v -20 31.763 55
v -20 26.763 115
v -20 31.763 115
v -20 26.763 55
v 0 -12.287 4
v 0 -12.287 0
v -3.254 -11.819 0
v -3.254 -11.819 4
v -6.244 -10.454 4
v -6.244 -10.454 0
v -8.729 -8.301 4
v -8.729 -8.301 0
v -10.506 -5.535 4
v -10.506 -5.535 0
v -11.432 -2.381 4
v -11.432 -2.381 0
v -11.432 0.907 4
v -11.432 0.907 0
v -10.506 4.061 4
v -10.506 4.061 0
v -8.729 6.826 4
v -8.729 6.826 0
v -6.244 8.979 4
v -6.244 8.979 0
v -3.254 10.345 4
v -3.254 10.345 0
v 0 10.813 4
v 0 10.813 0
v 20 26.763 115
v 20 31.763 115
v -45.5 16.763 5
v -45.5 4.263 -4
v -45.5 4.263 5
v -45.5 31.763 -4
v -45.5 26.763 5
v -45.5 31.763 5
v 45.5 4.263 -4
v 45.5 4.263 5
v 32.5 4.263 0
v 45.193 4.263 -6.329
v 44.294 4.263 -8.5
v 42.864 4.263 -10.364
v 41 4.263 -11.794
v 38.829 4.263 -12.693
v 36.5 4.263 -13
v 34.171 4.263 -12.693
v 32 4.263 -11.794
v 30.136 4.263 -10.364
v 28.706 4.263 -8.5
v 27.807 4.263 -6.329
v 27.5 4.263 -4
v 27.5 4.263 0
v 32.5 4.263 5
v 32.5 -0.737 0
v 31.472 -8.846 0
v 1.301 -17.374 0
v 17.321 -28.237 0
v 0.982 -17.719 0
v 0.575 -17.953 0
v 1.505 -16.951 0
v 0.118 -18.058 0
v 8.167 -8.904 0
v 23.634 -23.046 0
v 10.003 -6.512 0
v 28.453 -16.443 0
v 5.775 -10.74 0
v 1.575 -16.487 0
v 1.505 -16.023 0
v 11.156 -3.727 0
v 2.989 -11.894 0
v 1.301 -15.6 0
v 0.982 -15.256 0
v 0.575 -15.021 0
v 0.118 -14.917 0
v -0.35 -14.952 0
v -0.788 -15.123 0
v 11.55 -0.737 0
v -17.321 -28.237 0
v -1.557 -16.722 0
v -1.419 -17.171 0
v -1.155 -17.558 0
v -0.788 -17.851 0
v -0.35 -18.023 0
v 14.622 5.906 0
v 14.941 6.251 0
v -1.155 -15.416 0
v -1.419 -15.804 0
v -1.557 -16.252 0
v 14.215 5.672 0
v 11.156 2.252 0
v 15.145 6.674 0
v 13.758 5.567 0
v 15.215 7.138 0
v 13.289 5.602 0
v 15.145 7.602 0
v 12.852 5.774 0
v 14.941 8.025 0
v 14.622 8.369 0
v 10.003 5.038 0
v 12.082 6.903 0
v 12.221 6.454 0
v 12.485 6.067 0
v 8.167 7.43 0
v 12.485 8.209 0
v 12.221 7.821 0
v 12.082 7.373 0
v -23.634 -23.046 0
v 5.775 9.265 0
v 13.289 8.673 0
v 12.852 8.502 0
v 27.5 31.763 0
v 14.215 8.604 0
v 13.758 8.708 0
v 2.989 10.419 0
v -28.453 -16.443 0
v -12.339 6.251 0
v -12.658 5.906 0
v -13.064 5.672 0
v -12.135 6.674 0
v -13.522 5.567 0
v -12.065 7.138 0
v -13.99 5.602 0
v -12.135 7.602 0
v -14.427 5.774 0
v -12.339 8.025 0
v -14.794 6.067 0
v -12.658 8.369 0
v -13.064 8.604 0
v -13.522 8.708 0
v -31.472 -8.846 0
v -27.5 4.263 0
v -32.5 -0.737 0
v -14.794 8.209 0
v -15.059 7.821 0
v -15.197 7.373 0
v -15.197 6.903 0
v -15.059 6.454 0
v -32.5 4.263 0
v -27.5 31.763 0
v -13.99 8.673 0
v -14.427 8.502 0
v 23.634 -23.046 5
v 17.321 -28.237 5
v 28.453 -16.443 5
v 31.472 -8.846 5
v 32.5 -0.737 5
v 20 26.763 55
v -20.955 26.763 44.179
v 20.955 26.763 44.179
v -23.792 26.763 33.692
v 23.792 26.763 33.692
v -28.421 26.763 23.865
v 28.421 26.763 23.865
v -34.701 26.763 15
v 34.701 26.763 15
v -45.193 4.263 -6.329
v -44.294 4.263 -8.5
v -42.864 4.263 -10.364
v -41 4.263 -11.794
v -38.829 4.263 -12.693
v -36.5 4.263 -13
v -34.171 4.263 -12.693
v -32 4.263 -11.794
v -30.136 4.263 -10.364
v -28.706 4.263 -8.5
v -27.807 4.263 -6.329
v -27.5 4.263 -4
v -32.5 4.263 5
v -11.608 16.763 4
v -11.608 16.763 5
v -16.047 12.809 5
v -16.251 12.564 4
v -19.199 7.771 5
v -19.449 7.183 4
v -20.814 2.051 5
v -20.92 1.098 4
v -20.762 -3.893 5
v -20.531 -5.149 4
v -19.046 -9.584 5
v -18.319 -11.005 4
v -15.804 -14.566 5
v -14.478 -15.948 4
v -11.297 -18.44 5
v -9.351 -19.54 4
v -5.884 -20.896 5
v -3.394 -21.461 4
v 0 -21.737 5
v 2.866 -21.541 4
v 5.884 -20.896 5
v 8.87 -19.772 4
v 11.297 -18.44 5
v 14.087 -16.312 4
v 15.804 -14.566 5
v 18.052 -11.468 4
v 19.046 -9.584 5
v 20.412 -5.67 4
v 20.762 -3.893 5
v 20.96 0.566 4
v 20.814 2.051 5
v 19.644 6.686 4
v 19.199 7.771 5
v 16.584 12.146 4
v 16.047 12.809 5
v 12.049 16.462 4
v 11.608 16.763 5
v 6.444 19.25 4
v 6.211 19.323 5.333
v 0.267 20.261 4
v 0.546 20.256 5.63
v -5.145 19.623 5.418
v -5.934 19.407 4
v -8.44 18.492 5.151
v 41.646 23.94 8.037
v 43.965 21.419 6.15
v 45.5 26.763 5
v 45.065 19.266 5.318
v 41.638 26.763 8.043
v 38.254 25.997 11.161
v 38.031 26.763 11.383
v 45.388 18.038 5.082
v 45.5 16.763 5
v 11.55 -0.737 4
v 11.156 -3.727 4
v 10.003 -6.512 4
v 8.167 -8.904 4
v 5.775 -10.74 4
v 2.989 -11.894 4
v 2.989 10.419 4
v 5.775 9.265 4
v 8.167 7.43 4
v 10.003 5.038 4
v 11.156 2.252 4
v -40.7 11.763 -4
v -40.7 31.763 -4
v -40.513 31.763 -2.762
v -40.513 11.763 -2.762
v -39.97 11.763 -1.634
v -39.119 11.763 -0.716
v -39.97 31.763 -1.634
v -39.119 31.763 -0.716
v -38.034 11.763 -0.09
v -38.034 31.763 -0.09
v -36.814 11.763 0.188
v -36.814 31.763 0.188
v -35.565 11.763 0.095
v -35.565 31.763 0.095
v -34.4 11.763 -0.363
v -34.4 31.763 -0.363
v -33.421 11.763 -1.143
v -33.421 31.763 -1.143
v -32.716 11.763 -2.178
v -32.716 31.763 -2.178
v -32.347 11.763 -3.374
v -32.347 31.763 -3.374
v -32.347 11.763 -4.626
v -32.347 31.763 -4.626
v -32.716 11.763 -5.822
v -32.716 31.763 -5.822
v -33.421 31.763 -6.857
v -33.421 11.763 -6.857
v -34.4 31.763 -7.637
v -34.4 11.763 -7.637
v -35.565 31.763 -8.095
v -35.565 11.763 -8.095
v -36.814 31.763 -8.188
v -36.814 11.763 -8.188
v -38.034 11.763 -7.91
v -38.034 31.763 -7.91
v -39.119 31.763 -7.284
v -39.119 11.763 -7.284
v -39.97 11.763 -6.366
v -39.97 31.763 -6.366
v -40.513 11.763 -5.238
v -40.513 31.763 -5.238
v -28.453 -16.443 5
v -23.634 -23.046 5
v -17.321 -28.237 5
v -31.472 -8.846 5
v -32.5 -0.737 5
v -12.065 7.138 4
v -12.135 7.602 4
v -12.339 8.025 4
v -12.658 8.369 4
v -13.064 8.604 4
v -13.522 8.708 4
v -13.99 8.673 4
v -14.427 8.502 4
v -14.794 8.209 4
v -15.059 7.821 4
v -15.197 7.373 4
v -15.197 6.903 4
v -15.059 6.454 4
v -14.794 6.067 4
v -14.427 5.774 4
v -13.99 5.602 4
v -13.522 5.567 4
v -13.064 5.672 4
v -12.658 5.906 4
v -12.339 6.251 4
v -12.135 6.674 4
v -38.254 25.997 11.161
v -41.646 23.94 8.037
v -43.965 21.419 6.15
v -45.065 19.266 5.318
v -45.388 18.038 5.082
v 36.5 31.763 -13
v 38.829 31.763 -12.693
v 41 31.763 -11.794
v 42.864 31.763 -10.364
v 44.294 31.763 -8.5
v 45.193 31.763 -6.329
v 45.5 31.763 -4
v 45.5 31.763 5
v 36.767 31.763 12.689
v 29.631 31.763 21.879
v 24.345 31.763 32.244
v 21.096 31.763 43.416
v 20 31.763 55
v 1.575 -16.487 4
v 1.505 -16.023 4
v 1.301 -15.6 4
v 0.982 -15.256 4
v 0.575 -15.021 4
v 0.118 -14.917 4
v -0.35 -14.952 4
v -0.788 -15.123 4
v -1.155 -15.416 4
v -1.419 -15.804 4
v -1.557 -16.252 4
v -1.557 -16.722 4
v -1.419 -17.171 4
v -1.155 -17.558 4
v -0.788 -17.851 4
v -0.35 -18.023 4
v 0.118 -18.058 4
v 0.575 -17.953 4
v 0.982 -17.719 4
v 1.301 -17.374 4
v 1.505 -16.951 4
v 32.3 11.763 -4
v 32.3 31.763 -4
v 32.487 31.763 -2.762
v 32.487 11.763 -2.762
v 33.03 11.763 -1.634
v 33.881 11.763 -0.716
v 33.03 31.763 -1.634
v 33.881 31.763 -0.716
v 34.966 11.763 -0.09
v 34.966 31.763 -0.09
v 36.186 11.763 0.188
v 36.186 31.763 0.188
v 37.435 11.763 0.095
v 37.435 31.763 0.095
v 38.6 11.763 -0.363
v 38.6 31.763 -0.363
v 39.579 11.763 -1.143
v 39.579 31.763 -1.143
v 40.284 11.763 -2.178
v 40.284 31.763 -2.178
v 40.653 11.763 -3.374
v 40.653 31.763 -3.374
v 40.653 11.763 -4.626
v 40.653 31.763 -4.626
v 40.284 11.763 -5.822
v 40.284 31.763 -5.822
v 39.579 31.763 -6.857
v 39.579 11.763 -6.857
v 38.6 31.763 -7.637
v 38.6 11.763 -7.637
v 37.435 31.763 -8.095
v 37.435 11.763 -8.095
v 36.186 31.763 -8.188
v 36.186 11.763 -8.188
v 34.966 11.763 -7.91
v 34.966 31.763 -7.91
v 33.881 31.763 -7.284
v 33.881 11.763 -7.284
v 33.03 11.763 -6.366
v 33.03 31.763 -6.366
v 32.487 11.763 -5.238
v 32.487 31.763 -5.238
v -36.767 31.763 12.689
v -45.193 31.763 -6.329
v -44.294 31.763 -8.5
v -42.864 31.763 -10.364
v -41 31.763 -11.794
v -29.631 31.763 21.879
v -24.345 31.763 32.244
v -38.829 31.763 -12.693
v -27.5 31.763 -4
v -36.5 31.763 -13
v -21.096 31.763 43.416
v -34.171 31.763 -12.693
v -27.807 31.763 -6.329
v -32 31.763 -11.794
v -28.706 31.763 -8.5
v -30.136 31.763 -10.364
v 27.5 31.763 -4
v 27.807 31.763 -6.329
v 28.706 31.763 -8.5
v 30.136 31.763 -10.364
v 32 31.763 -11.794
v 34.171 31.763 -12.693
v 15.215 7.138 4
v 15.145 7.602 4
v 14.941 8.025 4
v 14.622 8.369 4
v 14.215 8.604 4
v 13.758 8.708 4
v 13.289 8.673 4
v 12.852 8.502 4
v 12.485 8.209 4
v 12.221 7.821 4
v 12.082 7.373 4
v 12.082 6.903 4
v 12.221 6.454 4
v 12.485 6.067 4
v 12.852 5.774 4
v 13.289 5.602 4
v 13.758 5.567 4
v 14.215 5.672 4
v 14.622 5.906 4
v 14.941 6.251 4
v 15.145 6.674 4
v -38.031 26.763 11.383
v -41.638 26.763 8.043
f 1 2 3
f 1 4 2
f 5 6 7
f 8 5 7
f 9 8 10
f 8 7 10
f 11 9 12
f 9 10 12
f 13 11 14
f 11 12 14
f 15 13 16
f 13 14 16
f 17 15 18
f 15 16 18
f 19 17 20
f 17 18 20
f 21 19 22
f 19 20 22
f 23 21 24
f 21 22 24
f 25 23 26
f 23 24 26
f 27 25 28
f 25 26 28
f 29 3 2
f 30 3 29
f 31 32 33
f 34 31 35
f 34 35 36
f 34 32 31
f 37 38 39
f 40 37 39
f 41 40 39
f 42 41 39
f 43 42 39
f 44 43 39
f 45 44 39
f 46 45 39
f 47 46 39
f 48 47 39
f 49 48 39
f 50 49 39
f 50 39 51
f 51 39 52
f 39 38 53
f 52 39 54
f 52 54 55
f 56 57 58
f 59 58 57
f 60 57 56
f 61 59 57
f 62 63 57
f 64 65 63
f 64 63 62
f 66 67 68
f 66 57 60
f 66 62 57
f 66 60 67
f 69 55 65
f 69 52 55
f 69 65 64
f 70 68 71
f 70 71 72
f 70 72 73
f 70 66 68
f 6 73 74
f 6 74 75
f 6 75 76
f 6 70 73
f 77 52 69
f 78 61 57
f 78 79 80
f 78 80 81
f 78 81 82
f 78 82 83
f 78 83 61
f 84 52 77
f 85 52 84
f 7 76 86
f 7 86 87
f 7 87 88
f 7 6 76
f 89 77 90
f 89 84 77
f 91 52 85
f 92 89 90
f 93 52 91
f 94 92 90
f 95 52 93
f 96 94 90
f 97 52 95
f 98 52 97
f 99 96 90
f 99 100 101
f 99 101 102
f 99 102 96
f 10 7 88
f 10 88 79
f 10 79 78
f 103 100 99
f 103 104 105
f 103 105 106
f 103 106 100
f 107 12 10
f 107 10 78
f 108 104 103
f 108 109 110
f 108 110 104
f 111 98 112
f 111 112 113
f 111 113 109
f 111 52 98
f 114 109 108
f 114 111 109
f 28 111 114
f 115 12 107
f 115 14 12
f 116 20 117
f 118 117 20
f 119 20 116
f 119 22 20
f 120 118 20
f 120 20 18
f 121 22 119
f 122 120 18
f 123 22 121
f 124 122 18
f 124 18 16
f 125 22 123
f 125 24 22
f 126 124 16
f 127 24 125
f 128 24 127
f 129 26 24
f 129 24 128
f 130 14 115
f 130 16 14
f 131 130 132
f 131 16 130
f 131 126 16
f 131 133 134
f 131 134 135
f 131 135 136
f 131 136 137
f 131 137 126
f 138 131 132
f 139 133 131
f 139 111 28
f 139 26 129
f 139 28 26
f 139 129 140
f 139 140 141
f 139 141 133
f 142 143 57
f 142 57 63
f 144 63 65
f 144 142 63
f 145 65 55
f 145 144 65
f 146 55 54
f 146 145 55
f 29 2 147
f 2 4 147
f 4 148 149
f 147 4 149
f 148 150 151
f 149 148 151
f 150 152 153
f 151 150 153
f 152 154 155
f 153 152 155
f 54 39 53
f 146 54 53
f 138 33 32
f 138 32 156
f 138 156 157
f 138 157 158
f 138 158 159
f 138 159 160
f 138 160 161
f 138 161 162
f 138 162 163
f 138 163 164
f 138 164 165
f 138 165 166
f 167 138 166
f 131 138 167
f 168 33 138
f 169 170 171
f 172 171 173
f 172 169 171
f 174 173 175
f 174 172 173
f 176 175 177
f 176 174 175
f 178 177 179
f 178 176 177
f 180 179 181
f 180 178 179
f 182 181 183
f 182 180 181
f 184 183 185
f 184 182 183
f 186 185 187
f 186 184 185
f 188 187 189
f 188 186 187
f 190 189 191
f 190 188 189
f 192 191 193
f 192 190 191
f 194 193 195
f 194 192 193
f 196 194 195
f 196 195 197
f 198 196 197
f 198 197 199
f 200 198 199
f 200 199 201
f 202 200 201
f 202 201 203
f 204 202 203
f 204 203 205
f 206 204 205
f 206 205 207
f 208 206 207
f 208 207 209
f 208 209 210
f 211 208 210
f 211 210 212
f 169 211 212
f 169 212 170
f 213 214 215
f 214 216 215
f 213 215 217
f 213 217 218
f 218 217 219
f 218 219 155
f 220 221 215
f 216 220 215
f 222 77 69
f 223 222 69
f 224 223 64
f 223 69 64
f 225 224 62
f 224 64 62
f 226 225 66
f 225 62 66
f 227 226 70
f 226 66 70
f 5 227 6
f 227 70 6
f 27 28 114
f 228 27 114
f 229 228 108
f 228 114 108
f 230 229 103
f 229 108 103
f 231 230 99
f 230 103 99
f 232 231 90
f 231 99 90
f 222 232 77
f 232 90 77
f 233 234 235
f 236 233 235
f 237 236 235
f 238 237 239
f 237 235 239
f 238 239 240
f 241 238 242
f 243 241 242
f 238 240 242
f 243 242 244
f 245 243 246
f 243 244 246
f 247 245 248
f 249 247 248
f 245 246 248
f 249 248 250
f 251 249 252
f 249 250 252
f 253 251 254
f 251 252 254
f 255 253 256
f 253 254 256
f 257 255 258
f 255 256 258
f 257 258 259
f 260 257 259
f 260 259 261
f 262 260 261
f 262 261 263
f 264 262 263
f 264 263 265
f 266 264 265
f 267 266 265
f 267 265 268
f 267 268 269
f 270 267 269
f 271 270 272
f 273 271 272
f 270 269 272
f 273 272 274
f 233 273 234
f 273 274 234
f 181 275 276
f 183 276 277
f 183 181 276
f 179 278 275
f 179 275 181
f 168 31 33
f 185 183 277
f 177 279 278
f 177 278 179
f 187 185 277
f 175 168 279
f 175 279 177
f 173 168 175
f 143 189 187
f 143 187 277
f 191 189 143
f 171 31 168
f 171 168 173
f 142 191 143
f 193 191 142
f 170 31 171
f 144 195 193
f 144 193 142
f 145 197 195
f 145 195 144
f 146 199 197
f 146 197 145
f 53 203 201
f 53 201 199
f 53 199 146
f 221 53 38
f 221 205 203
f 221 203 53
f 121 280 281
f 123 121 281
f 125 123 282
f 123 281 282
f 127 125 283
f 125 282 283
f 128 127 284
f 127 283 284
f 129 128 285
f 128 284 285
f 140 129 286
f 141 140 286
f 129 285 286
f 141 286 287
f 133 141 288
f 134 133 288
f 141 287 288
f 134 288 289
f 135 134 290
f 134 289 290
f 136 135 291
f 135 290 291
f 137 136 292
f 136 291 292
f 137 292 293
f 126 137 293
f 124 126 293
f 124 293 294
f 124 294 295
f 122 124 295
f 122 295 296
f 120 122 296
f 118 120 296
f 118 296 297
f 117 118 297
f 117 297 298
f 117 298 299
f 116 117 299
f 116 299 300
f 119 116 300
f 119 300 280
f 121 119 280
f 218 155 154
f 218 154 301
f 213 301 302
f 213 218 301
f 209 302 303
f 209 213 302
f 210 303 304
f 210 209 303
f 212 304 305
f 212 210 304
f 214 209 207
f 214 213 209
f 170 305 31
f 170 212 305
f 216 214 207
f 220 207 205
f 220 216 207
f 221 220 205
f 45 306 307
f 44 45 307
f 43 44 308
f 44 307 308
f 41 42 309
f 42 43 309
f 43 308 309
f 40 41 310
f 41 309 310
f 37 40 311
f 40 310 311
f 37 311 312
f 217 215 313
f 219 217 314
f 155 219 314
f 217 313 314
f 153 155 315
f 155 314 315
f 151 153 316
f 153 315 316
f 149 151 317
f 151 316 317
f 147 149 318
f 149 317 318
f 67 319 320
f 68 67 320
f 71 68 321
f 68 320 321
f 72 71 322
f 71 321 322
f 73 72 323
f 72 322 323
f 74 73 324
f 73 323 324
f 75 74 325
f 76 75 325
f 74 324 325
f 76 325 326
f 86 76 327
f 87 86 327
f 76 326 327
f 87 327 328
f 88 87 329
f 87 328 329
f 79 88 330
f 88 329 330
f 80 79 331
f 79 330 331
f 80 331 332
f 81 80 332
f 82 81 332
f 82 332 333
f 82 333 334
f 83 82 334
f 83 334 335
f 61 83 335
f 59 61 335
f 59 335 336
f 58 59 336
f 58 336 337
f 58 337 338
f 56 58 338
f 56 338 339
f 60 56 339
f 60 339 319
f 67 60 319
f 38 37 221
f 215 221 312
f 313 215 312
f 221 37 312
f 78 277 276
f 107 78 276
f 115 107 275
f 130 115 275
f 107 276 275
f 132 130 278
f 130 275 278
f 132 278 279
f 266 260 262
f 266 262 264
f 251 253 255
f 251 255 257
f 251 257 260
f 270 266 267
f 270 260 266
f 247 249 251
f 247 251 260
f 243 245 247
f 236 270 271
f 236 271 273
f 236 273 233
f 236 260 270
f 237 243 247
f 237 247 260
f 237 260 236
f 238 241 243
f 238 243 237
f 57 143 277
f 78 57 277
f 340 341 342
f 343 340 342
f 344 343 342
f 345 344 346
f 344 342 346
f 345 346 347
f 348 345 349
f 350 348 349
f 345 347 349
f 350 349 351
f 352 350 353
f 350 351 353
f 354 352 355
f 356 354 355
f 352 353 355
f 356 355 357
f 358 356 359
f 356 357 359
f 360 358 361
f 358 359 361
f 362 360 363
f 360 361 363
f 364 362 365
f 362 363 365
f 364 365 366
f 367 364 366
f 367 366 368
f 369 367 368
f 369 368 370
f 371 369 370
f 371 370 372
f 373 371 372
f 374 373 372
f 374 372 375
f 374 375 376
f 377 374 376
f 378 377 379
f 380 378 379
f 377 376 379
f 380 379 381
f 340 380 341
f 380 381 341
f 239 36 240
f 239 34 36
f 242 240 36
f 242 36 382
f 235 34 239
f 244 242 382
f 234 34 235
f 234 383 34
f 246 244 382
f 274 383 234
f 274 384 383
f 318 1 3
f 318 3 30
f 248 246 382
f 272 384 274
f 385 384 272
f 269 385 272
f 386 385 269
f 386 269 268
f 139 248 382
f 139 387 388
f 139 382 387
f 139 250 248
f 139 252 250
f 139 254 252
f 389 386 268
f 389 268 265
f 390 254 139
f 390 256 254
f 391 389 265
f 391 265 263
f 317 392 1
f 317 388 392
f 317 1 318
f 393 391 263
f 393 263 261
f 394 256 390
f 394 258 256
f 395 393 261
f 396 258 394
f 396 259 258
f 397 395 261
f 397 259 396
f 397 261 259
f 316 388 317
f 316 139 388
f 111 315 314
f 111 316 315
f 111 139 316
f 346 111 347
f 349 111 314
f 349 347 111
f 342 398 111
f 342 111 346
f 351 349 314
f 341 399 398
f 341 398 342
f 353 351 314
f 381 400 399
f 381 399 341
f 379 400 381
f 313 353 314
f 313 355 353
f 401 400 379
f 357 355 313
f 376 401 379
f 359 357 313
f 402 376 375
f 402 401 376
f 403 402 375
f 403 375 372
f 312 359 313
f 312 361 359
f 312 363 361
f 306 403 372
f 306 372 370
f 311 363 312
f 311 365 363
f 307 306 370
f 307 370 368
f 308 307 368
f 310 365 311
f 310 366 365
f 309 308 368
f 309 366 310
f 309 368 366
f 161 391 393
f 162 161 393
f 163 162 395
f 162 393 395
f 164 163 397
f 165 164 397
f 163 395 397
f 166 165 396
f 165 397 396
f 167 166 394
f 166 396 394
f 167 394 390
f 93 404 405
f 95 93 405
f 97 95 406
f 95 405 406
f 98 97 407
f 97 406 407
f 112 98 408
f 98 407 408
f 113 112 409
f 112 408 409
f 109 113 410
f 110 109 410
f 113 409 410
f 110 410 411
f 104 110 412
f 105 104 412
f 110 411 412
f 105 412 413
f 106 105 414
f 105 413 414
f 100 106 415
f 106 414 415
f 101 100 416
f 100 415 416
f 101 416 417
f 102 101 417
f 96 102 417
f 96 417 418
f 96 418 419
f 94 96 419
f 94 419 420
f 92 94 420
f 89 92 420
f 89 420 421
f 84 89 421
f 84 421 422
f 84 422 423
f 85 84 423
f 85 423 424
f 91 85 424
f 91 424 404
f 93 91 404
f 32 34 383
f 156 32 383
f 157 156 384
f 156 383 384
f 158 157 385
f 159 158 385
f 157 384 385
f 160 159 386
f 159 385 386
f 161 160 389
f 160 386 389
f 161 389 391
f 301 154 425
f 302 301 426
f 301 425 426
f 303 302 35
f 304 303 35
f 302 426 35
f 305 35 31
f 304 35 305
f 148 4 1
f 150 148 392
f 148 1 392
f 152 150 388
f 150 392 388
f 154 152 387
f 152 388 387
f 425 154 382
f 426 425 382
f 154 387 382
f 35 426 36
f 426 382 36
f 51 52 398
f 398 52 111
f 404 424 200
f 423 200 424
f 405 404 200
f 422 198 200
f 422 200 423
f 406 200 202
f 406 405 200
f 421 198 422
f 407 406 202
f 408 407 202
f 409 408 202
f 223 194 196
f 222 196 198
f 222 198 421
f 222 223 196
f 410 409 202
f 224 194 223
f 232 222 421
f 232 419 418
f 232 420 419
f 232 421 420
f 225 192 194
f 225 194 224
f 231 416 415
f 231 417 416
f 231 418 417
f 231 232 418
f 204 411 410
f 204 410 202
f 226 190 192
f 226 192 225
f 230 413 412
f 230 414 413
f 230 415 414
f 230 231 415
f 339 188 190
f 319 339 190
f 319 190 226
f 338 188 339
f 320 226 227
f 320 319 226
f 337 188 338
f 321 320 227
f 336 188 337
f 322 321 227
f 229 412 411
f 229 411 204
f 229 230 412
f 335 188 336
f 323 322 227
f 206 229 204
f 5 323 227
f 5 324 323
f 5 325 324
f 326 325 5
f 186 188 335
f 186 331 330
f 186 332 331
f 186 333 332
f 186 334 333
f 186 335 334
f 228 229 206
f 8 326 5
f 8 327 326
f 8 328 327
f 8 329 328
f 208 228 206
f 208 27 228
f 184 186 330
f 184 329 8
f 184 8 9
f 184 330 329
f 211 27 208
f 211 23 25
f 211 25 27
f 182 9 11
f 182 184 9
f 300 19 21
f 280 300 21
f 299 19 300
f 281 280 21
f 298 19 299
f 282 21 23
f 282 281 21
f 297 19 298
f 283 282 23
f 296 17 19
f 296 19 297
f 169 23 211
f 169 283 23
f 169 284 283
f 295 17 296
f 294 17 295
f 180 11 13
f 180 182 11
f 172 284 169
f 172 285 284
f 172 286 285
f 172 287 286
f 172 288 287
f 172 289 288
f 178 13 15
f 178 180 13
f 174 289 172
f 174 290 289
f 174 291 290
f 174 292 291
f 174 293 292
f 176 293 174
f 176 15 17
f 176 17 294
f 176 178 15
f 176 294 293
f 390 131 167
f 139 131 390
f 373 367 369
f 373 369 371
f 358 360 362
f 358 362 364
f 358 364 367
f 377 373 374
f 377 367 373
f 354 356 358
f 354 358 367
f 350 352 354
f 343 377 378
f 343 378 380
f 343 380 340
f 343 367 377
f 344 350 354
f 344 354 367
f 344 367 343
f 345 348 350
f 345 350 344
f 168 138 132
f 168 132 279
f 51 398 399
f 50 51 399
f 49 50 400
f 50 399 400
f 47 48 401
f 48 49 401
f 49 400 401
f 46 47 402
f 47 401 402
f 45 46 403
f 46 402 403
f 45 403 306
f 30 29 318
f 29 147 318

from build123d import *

# Parameters (mm, degrees)
SKETCH1_W                = 9
SKETCH1_H                = 55
SKETCH1_W_2              = 91
SKETCH1_H_2              = 5
BOSS_EXTRUDE3_DEPTH      = 5
SKETCH6_W                = 18
SKETCH6_H                = 60
BOSS_EXTRUDE4_DEPTH      = 18
SKETCH7_W                = 91
SKETCH7_H                = 5
BOSS_EXTRUDE5_DEPTH      = 100
SKETCH13_W               = 18
SKETCH13_H               = 5
CUT_EXTRUDE6_DEPTH       = 75
SKETCH16_R               = 4.2
CUT_EXTRUDE7_DEPTH       = 20
CUT_EXTRUDE8_DEPTH       = 75
CUT_EXTRUDE10_DEPTH      = 8
CUT_EXTRUDE11_DEPTH      = 22
CUT_EXTRUDE14_DEPTH      = 34
CUT_EXTRUDE14_DEPTH_BACK = 5
FILLET4_R                = 10
CUT_EXTRUDE15_DEPTH      = 24
CUT_EXTRUDE15_DEPTH_BACK = 1
SKETCH23_R               = 21
SKETCH26_R               = 1.575
CUT_EXTRUDE16_DEPTH      = 10
SKETCH27_W               = 40
SKETCH27_H               = 5
BOSS_EXTRUDE6_DEPTH      = 10


with BuildPart() as part:
    # Sketch1 → Boss-Extrude3 (new body)
    with BuildSketch(Plane.XY):
        with Locations((41, -0.737170899)):
            Rectangle(SKETCH1_W, SKETCH1_H)
        with Locations((32, -0.737170899)):
            Rectangle(SKETCH1_W, SKETCH1_H)
        with BuildLine():
            Line((27.5, 26.762829101), (0, 26.762829101))
            Line((0, 26.762829101), (0, 10.812829101))
            ThreePointArc((0, 10.812829101), (8.167083323, 7.429912424), (11.55, -0.737170899))
            ThreePointArc((11.55, -0.737170899), (8.167083323, -8.904254222), (0, -12.287170899))
            Line((0, -12.287170899), (0, -28.237170899))
            Line((0, -28.237170899), (27.5, -28.237170899))
            Line((27.5, -28.237170899), (27.5, 26.762829101))
        make_face()
        with BuildLine():
            Line((0, 10.812829101), (0, 26.762829101))
            Line((0, 26.762829101), (-27.5, 26.762829101))
            Line((-27.5, 26.762829101), (-27.5, -28.237170899))
            Line((-27.5, -28.237170899), (0, -28.237170899))
            Line((0, -28.237170899), (0, -12.287170899))
            ThreePointArc((0, -12.287170899), (-11.55, -0.737170899), (0, 10.812829101))
        make_face()
        with Locations((-32, -0.737170899)):
            Rectangle(SKETCH1_W, SKETCH1_H)
        with Locations((-41, -0.737170899)):
            Rectangle(SKETCH1_W, SKETCH1_H)
        with Locations((0, 29.262829101)):
            Rectangle(SKETCH1_W_2, SKETCH1_H_2)
    extrude(amount=BOSS_EXTRUDE3_DEPTH)

    # Sketch6 → Boss-Extrude4 (add)
    with BuildSketch(Plane(origin=(0, 0, 0), x_dir=(-1, 0, 0), z_dir=(0, 0, -1))):
        with Locations((-36.5, 1.762829101)):
            Rectangle(SKETCH6_W, SKETCH6_H)
        with Locations((36.5, 1.762829101)):
            Rectangle(SKETCH6_W, SKETCH6_H)
    extrude(amount=BOSS_EXTRUDE4_DEPTH)

    # Sketch7 → Boss-Extrude5 (add)
    with BuildSketch(Plane.XY.offset(5)):
        with Locations((0, 29.262829101)):
            Rectangle(SKETCH7_W, SKETCH7_H)
    extrude(amount=BOSS_EXTRUDE5_DEPTH)

    # Sketch13 → Cut-Extrude6 (cut)
    with BuildSketch(Plane(origin=(0, 31.762829101, 0), x_dir=(1, 0, 0), z_dir=(0, 1, 0))):
        with Locations((-36.5, 15.5)):
            Rectangle(SKETCH13_W, SKETCH13_H)
        with Locations((36.5, 15.5)):
            Rectangle(SKETCH13_W, SKETCH13_H)
    extrude(amount=-CUT_EXTRUDE6_DEPTH, mode=Mode.SUBTRACT)

    # Sketch16 → Cut-Extrude7 (cut)
    with BuildSketch(Plane(origin=(0, 31.762829101, 0), x_dir=(1, 0, 0), z_dir=(0, 1, 0))):
        with Locations(Location((-36.5, 4, 0), (0, 0, 180))):
            Circle(SKETCH16_R)
        with Locations(Location((36.5, 4, 0), (0, 0, 180))):
            Circle(SKETCH16_R)
    extrude(amount=-CUT_EXTRUDE7_DEPTH, mode=Mode.SUBTRACT)

    # Sketch17 → Cut-Extrude8 (cut)
    with BuildSketch(Plane(origin=(0, 31.762829101, 0), x_dir=(1, 0, 0), z_dir=(0, 1, 0))):
        with BuildLine():
            Line((-45.5, 13), (-45.5, 4))
            ThreePointArc((-45.5, 4), (-42.863961031, 10.363961031), (-36.5, 13))
            Line((-36.5, 13), (-45.5, 13))
        make_face()
        with BuildLine():
            ThreePointArc((-36.5, 13), (-30.136038969, 10.363961031), (-27.5, 4))
            Line((-27.5, 4), (-27.5, 13))
            Line((-27.5, 13), (-36.5, 13))
        make_face()
        with BuildLine():
            Line((27.5, 13), (27.5, 4))
            ThreePointArc((27.5, 4), (30.136038969, 10.363961031), (36.5, 13))
            Line((36.5, 13), (27.5, 13))
        make_face()
        with BuildLine():
            Line((45.5, 13), (36.5, 13))
            ThreePointArc((36.5, 13), (42.863961031, 10.363961031), (45.5, 4))
            Line((45.5, 4), (45.5, 13))
        make_face()
    extrude(amount=-CUT_EXTRUDE8_DEPTH, mode=Mode.SUBTRACT)

    # Sketch18 → Cut-Extrude10 (cut)
    with BuildSketch(Plane(origin=(0, 31.762829101, 0), x_dir=(1, 0, 0), z_dir=(0, 1, 0))):
        with BuildLine():
            ThreePointArc((-45.5, -105), (-26.743051045, -83.063543967), (-20, -55))
            Line((-20, -55), (-45.5, -55))
            Line((-45.5, -55), (-45.5, -105))
        make_face()
        with BuildLine():
            Line((-45.5, -55), (-20, -55))
            ThreePointArc((-20, -55), (-26.743051045, -26.936456033), (-45.5, -5))
            Line((-45.5, -5), (-45.5, -55))
        make_face()
        with BuildLine():
            ThreePointArc((-45.5, -105), (-26.743051045, -83.063543967), (-20, -55))
            Line((-20, -55), (-45.5, -55))
            Line((-45.5, -55), (-45.5, -105))
        make_face()
        with BuildLine():
            Line((-45.5, -55), (-20, -55))
            ThreePointArc((-20, -55), (-26.743051045, -26.936456033), (-45.5, -5))
            Line((-45.5, -5), (-45.5, -55))
        make_face()
        with BuildLine():
            Line((-20, -105), (-20, -55))
            ThreePointArc((-20, -55), (-26.743051045, -83.063543967), (-45.5, -105))
            Line((-45.5, -105), (-20, -105))
        make_face()
        with BuildLine():
            Line((20, -55), (20, -105))
            Line((20, -105), (45.5, -105))
            ThreePointArc((45.5, -105), (26.743051045, -83.063543967), (20, -55))
        make_face()
        with BuildLine():
            Line((45.5, -55), (45.5, -5))
            ThreePointArc((45.5, -5), (26.743051045, -26.936456033), (20, -55))
            Line((20, -55), (45.5, -55))
        make_face()
        with BuildLine():
            ThreePointArc((20, -55), (26.743051045, -83.063543967), (45.5, -105))
            Line((45.5, -105), (45.5, -55))
            Line((45.5, -55), (20, -55))
        make_face()
        with BuildLine():
            Line((45.5, -55), (45.5, -5))
            ThreePointArc((45.5, -5), (26.743051045, -26.936456033), (20, -55))
            Line((20, -55), (45.5, -55))
        make_face()
        with BuildLine():
            ThreePointArc((20, -55), (26.743051045, -83.063543967), (45.5, -105))
            Line((45.5, -105), (45.5, -55))
            Line((45.5, -55), (20, -55))
        make_face()
    extrude(amount=-CUT_EXTRUDE10_DEPTH, mode=Mode.SUBTRACT)

    # Sketch19 → Cut-Extrude11 (cut)
    with BuildSketch(Plane.XY.offset(5)):
        with BuildLine():
            Line((-32.5, -0.737170899), (-45.5, -0.737170899))
            Line((-45.5, -0.737170899), (-45.5, -28.237170899))
            Line((-45.5, -28.237170899), (-17.320508076, -28.237170899))
            ThreePointArc((-17.320508076, -28.237170899), (-28.453176558, -16.442798673), (-32.5, -0.737170899))
        make_face()
        with BuildLine():
            Line((45.5, -28.237170899), (17.320508076, -28.237170899))
            ThreePointArc((17.320508076, -28.237170899), (28.453176558, -16.442798673), (32.5, -0.737170899))
            Line((32.5, -0.737170899), (45.5, -0.737170899))
            Line((45.5, -0.737170899), (45.5, -28.237170899))
        make_face()
    extrude(amount=-CUT_EXTRUDE11_DEPTH, mode=Mode.SUBTRACT)

    # Sketch21 → Cut-Extrude14 (cut, two sides: drawn at the far end of the back side and taken through both)
    with BuildSketch(Plane.XZ.offset(0.737170899).offset(-CUT_EXTRUDE14_DEPTH_BACK)):
        with BuildLine():
            Line((27.5, 0), (32.5, 0))
            Line((32.5, 0), (32.5, 5))
            Line((32.5, 5), (45.5, 5))
            Line((45.5, 5), (45.5, -4))
            ThreePointArc((45.5, -4), (36.5, -13), (27.5, -4))
            Line((27.5, -4), (27.5, 0))
        make_face()
        with BuildLine():
            Line((-27.5, -4), (-27.5, 0))
            Line((-27.5, 0), (-32.5, 0))
            Line((-32.5, 0), (-32.5, 5))
            Line((-32.5, 5), (-45.5, 5))
            Line((-45.5, 5), (-45.5, -4))
            ThreePointArc((-45.5, -4), (-36.5, -13), (-27.5, -4))
        make_face()
    extrude(amount=CUT_EXTRUDE14_DEPTH + CUT_EXTRUDE14_DEPTH_BACK, mode=Mode.SUBTRACT)

    # Fillet4
    # the kernel refuses this fillet: 10 mm, written as the material it adds along each edge
    with BuildSketch(Plane(origin=(70.5, 26.762829101, 5), x_dir=(0, -1, 0), z_dir=(-1, 0, 0))) as fillet4_piece_1_section:
        with BuildLine():
            CenterArc((FILLET4_R, FILLET4_R), FILLET4_R, 180, 90)
            Line((0, FILLET4_R), (0, 0))
            Line((0, 0), (FILLET4_R, 0))
        make_face()
    fillet4_piece_1 = extrude(amount=141, mode=Mode.PRIVATE)
    fillet4_piece_1 = fillet4_piece_1 - Plane(origin=(-81.769607843, 24.471447362, 55), x_dir=(0.5871756209824568, 0, 0.8094595667010591), z_dir=(0, 1, 0)) * Cylinder(61.769607843, 322, mode=Mode.PRIVATE)
    fillet4_piece_1 = fillet4_piece_1 - Plane(origin=(81.769607843, 24.471447362, 55), x_dir=(-0.5871756209824566, 0, -0.8094595667010592), z_dir=(0, 1, 0)) * Cylinder(61.769607843, 322, mode=Mode.PRIVATE)
    add(fillet4_piece_1)

    # Sketch23 → Cut-Extrude15 (cut, two sides: drawn at the far end of the back side and taken through both)
    with BuildSketch(Plane.XY.offset(5).offset(-CUT_EXTRUDE15_DEPTH_BACK)):
        with Locations(Location((0, -0.737170899, 0), (0, 0, 123.557309762))):
            Circle(SKETCH23_R)
    extrude(amount=CUT_EXTRUDE15_DEPTH + CUT_EXTRUDE15_DEPTH_BACK, mode=Mode.SUBTRACT)

    # Sketch26 → Cut-Extrude16 (cut)
    with BuildSketch(Plane.XY.offset(4)):
        with Locations((0, -16.487170899)):
            Circle(SKETCH26_R)
        with Locations((-13.63990011, 7.137829101)):
            Circle(SKETCH26_R)
        with Locations((13.63990011, 7.137829101)):
            Circle(SKETCH26_R)
    extrude(amount=-CUT_EXTRUDE16_DEPTH, mode=Mode.SUBTRACT)

    # Sketch27 → Boss-Extrude6 (add)
    with BuildSketch(Plane.XY.offset(105)):
        with Locations((0, 29.262829101)):
            Rectangle(SKETCH27_W, SKETCH27_H)
    extrude(amount=BOSS_EXTRUDE6_DEPTH)


solid = part.part
